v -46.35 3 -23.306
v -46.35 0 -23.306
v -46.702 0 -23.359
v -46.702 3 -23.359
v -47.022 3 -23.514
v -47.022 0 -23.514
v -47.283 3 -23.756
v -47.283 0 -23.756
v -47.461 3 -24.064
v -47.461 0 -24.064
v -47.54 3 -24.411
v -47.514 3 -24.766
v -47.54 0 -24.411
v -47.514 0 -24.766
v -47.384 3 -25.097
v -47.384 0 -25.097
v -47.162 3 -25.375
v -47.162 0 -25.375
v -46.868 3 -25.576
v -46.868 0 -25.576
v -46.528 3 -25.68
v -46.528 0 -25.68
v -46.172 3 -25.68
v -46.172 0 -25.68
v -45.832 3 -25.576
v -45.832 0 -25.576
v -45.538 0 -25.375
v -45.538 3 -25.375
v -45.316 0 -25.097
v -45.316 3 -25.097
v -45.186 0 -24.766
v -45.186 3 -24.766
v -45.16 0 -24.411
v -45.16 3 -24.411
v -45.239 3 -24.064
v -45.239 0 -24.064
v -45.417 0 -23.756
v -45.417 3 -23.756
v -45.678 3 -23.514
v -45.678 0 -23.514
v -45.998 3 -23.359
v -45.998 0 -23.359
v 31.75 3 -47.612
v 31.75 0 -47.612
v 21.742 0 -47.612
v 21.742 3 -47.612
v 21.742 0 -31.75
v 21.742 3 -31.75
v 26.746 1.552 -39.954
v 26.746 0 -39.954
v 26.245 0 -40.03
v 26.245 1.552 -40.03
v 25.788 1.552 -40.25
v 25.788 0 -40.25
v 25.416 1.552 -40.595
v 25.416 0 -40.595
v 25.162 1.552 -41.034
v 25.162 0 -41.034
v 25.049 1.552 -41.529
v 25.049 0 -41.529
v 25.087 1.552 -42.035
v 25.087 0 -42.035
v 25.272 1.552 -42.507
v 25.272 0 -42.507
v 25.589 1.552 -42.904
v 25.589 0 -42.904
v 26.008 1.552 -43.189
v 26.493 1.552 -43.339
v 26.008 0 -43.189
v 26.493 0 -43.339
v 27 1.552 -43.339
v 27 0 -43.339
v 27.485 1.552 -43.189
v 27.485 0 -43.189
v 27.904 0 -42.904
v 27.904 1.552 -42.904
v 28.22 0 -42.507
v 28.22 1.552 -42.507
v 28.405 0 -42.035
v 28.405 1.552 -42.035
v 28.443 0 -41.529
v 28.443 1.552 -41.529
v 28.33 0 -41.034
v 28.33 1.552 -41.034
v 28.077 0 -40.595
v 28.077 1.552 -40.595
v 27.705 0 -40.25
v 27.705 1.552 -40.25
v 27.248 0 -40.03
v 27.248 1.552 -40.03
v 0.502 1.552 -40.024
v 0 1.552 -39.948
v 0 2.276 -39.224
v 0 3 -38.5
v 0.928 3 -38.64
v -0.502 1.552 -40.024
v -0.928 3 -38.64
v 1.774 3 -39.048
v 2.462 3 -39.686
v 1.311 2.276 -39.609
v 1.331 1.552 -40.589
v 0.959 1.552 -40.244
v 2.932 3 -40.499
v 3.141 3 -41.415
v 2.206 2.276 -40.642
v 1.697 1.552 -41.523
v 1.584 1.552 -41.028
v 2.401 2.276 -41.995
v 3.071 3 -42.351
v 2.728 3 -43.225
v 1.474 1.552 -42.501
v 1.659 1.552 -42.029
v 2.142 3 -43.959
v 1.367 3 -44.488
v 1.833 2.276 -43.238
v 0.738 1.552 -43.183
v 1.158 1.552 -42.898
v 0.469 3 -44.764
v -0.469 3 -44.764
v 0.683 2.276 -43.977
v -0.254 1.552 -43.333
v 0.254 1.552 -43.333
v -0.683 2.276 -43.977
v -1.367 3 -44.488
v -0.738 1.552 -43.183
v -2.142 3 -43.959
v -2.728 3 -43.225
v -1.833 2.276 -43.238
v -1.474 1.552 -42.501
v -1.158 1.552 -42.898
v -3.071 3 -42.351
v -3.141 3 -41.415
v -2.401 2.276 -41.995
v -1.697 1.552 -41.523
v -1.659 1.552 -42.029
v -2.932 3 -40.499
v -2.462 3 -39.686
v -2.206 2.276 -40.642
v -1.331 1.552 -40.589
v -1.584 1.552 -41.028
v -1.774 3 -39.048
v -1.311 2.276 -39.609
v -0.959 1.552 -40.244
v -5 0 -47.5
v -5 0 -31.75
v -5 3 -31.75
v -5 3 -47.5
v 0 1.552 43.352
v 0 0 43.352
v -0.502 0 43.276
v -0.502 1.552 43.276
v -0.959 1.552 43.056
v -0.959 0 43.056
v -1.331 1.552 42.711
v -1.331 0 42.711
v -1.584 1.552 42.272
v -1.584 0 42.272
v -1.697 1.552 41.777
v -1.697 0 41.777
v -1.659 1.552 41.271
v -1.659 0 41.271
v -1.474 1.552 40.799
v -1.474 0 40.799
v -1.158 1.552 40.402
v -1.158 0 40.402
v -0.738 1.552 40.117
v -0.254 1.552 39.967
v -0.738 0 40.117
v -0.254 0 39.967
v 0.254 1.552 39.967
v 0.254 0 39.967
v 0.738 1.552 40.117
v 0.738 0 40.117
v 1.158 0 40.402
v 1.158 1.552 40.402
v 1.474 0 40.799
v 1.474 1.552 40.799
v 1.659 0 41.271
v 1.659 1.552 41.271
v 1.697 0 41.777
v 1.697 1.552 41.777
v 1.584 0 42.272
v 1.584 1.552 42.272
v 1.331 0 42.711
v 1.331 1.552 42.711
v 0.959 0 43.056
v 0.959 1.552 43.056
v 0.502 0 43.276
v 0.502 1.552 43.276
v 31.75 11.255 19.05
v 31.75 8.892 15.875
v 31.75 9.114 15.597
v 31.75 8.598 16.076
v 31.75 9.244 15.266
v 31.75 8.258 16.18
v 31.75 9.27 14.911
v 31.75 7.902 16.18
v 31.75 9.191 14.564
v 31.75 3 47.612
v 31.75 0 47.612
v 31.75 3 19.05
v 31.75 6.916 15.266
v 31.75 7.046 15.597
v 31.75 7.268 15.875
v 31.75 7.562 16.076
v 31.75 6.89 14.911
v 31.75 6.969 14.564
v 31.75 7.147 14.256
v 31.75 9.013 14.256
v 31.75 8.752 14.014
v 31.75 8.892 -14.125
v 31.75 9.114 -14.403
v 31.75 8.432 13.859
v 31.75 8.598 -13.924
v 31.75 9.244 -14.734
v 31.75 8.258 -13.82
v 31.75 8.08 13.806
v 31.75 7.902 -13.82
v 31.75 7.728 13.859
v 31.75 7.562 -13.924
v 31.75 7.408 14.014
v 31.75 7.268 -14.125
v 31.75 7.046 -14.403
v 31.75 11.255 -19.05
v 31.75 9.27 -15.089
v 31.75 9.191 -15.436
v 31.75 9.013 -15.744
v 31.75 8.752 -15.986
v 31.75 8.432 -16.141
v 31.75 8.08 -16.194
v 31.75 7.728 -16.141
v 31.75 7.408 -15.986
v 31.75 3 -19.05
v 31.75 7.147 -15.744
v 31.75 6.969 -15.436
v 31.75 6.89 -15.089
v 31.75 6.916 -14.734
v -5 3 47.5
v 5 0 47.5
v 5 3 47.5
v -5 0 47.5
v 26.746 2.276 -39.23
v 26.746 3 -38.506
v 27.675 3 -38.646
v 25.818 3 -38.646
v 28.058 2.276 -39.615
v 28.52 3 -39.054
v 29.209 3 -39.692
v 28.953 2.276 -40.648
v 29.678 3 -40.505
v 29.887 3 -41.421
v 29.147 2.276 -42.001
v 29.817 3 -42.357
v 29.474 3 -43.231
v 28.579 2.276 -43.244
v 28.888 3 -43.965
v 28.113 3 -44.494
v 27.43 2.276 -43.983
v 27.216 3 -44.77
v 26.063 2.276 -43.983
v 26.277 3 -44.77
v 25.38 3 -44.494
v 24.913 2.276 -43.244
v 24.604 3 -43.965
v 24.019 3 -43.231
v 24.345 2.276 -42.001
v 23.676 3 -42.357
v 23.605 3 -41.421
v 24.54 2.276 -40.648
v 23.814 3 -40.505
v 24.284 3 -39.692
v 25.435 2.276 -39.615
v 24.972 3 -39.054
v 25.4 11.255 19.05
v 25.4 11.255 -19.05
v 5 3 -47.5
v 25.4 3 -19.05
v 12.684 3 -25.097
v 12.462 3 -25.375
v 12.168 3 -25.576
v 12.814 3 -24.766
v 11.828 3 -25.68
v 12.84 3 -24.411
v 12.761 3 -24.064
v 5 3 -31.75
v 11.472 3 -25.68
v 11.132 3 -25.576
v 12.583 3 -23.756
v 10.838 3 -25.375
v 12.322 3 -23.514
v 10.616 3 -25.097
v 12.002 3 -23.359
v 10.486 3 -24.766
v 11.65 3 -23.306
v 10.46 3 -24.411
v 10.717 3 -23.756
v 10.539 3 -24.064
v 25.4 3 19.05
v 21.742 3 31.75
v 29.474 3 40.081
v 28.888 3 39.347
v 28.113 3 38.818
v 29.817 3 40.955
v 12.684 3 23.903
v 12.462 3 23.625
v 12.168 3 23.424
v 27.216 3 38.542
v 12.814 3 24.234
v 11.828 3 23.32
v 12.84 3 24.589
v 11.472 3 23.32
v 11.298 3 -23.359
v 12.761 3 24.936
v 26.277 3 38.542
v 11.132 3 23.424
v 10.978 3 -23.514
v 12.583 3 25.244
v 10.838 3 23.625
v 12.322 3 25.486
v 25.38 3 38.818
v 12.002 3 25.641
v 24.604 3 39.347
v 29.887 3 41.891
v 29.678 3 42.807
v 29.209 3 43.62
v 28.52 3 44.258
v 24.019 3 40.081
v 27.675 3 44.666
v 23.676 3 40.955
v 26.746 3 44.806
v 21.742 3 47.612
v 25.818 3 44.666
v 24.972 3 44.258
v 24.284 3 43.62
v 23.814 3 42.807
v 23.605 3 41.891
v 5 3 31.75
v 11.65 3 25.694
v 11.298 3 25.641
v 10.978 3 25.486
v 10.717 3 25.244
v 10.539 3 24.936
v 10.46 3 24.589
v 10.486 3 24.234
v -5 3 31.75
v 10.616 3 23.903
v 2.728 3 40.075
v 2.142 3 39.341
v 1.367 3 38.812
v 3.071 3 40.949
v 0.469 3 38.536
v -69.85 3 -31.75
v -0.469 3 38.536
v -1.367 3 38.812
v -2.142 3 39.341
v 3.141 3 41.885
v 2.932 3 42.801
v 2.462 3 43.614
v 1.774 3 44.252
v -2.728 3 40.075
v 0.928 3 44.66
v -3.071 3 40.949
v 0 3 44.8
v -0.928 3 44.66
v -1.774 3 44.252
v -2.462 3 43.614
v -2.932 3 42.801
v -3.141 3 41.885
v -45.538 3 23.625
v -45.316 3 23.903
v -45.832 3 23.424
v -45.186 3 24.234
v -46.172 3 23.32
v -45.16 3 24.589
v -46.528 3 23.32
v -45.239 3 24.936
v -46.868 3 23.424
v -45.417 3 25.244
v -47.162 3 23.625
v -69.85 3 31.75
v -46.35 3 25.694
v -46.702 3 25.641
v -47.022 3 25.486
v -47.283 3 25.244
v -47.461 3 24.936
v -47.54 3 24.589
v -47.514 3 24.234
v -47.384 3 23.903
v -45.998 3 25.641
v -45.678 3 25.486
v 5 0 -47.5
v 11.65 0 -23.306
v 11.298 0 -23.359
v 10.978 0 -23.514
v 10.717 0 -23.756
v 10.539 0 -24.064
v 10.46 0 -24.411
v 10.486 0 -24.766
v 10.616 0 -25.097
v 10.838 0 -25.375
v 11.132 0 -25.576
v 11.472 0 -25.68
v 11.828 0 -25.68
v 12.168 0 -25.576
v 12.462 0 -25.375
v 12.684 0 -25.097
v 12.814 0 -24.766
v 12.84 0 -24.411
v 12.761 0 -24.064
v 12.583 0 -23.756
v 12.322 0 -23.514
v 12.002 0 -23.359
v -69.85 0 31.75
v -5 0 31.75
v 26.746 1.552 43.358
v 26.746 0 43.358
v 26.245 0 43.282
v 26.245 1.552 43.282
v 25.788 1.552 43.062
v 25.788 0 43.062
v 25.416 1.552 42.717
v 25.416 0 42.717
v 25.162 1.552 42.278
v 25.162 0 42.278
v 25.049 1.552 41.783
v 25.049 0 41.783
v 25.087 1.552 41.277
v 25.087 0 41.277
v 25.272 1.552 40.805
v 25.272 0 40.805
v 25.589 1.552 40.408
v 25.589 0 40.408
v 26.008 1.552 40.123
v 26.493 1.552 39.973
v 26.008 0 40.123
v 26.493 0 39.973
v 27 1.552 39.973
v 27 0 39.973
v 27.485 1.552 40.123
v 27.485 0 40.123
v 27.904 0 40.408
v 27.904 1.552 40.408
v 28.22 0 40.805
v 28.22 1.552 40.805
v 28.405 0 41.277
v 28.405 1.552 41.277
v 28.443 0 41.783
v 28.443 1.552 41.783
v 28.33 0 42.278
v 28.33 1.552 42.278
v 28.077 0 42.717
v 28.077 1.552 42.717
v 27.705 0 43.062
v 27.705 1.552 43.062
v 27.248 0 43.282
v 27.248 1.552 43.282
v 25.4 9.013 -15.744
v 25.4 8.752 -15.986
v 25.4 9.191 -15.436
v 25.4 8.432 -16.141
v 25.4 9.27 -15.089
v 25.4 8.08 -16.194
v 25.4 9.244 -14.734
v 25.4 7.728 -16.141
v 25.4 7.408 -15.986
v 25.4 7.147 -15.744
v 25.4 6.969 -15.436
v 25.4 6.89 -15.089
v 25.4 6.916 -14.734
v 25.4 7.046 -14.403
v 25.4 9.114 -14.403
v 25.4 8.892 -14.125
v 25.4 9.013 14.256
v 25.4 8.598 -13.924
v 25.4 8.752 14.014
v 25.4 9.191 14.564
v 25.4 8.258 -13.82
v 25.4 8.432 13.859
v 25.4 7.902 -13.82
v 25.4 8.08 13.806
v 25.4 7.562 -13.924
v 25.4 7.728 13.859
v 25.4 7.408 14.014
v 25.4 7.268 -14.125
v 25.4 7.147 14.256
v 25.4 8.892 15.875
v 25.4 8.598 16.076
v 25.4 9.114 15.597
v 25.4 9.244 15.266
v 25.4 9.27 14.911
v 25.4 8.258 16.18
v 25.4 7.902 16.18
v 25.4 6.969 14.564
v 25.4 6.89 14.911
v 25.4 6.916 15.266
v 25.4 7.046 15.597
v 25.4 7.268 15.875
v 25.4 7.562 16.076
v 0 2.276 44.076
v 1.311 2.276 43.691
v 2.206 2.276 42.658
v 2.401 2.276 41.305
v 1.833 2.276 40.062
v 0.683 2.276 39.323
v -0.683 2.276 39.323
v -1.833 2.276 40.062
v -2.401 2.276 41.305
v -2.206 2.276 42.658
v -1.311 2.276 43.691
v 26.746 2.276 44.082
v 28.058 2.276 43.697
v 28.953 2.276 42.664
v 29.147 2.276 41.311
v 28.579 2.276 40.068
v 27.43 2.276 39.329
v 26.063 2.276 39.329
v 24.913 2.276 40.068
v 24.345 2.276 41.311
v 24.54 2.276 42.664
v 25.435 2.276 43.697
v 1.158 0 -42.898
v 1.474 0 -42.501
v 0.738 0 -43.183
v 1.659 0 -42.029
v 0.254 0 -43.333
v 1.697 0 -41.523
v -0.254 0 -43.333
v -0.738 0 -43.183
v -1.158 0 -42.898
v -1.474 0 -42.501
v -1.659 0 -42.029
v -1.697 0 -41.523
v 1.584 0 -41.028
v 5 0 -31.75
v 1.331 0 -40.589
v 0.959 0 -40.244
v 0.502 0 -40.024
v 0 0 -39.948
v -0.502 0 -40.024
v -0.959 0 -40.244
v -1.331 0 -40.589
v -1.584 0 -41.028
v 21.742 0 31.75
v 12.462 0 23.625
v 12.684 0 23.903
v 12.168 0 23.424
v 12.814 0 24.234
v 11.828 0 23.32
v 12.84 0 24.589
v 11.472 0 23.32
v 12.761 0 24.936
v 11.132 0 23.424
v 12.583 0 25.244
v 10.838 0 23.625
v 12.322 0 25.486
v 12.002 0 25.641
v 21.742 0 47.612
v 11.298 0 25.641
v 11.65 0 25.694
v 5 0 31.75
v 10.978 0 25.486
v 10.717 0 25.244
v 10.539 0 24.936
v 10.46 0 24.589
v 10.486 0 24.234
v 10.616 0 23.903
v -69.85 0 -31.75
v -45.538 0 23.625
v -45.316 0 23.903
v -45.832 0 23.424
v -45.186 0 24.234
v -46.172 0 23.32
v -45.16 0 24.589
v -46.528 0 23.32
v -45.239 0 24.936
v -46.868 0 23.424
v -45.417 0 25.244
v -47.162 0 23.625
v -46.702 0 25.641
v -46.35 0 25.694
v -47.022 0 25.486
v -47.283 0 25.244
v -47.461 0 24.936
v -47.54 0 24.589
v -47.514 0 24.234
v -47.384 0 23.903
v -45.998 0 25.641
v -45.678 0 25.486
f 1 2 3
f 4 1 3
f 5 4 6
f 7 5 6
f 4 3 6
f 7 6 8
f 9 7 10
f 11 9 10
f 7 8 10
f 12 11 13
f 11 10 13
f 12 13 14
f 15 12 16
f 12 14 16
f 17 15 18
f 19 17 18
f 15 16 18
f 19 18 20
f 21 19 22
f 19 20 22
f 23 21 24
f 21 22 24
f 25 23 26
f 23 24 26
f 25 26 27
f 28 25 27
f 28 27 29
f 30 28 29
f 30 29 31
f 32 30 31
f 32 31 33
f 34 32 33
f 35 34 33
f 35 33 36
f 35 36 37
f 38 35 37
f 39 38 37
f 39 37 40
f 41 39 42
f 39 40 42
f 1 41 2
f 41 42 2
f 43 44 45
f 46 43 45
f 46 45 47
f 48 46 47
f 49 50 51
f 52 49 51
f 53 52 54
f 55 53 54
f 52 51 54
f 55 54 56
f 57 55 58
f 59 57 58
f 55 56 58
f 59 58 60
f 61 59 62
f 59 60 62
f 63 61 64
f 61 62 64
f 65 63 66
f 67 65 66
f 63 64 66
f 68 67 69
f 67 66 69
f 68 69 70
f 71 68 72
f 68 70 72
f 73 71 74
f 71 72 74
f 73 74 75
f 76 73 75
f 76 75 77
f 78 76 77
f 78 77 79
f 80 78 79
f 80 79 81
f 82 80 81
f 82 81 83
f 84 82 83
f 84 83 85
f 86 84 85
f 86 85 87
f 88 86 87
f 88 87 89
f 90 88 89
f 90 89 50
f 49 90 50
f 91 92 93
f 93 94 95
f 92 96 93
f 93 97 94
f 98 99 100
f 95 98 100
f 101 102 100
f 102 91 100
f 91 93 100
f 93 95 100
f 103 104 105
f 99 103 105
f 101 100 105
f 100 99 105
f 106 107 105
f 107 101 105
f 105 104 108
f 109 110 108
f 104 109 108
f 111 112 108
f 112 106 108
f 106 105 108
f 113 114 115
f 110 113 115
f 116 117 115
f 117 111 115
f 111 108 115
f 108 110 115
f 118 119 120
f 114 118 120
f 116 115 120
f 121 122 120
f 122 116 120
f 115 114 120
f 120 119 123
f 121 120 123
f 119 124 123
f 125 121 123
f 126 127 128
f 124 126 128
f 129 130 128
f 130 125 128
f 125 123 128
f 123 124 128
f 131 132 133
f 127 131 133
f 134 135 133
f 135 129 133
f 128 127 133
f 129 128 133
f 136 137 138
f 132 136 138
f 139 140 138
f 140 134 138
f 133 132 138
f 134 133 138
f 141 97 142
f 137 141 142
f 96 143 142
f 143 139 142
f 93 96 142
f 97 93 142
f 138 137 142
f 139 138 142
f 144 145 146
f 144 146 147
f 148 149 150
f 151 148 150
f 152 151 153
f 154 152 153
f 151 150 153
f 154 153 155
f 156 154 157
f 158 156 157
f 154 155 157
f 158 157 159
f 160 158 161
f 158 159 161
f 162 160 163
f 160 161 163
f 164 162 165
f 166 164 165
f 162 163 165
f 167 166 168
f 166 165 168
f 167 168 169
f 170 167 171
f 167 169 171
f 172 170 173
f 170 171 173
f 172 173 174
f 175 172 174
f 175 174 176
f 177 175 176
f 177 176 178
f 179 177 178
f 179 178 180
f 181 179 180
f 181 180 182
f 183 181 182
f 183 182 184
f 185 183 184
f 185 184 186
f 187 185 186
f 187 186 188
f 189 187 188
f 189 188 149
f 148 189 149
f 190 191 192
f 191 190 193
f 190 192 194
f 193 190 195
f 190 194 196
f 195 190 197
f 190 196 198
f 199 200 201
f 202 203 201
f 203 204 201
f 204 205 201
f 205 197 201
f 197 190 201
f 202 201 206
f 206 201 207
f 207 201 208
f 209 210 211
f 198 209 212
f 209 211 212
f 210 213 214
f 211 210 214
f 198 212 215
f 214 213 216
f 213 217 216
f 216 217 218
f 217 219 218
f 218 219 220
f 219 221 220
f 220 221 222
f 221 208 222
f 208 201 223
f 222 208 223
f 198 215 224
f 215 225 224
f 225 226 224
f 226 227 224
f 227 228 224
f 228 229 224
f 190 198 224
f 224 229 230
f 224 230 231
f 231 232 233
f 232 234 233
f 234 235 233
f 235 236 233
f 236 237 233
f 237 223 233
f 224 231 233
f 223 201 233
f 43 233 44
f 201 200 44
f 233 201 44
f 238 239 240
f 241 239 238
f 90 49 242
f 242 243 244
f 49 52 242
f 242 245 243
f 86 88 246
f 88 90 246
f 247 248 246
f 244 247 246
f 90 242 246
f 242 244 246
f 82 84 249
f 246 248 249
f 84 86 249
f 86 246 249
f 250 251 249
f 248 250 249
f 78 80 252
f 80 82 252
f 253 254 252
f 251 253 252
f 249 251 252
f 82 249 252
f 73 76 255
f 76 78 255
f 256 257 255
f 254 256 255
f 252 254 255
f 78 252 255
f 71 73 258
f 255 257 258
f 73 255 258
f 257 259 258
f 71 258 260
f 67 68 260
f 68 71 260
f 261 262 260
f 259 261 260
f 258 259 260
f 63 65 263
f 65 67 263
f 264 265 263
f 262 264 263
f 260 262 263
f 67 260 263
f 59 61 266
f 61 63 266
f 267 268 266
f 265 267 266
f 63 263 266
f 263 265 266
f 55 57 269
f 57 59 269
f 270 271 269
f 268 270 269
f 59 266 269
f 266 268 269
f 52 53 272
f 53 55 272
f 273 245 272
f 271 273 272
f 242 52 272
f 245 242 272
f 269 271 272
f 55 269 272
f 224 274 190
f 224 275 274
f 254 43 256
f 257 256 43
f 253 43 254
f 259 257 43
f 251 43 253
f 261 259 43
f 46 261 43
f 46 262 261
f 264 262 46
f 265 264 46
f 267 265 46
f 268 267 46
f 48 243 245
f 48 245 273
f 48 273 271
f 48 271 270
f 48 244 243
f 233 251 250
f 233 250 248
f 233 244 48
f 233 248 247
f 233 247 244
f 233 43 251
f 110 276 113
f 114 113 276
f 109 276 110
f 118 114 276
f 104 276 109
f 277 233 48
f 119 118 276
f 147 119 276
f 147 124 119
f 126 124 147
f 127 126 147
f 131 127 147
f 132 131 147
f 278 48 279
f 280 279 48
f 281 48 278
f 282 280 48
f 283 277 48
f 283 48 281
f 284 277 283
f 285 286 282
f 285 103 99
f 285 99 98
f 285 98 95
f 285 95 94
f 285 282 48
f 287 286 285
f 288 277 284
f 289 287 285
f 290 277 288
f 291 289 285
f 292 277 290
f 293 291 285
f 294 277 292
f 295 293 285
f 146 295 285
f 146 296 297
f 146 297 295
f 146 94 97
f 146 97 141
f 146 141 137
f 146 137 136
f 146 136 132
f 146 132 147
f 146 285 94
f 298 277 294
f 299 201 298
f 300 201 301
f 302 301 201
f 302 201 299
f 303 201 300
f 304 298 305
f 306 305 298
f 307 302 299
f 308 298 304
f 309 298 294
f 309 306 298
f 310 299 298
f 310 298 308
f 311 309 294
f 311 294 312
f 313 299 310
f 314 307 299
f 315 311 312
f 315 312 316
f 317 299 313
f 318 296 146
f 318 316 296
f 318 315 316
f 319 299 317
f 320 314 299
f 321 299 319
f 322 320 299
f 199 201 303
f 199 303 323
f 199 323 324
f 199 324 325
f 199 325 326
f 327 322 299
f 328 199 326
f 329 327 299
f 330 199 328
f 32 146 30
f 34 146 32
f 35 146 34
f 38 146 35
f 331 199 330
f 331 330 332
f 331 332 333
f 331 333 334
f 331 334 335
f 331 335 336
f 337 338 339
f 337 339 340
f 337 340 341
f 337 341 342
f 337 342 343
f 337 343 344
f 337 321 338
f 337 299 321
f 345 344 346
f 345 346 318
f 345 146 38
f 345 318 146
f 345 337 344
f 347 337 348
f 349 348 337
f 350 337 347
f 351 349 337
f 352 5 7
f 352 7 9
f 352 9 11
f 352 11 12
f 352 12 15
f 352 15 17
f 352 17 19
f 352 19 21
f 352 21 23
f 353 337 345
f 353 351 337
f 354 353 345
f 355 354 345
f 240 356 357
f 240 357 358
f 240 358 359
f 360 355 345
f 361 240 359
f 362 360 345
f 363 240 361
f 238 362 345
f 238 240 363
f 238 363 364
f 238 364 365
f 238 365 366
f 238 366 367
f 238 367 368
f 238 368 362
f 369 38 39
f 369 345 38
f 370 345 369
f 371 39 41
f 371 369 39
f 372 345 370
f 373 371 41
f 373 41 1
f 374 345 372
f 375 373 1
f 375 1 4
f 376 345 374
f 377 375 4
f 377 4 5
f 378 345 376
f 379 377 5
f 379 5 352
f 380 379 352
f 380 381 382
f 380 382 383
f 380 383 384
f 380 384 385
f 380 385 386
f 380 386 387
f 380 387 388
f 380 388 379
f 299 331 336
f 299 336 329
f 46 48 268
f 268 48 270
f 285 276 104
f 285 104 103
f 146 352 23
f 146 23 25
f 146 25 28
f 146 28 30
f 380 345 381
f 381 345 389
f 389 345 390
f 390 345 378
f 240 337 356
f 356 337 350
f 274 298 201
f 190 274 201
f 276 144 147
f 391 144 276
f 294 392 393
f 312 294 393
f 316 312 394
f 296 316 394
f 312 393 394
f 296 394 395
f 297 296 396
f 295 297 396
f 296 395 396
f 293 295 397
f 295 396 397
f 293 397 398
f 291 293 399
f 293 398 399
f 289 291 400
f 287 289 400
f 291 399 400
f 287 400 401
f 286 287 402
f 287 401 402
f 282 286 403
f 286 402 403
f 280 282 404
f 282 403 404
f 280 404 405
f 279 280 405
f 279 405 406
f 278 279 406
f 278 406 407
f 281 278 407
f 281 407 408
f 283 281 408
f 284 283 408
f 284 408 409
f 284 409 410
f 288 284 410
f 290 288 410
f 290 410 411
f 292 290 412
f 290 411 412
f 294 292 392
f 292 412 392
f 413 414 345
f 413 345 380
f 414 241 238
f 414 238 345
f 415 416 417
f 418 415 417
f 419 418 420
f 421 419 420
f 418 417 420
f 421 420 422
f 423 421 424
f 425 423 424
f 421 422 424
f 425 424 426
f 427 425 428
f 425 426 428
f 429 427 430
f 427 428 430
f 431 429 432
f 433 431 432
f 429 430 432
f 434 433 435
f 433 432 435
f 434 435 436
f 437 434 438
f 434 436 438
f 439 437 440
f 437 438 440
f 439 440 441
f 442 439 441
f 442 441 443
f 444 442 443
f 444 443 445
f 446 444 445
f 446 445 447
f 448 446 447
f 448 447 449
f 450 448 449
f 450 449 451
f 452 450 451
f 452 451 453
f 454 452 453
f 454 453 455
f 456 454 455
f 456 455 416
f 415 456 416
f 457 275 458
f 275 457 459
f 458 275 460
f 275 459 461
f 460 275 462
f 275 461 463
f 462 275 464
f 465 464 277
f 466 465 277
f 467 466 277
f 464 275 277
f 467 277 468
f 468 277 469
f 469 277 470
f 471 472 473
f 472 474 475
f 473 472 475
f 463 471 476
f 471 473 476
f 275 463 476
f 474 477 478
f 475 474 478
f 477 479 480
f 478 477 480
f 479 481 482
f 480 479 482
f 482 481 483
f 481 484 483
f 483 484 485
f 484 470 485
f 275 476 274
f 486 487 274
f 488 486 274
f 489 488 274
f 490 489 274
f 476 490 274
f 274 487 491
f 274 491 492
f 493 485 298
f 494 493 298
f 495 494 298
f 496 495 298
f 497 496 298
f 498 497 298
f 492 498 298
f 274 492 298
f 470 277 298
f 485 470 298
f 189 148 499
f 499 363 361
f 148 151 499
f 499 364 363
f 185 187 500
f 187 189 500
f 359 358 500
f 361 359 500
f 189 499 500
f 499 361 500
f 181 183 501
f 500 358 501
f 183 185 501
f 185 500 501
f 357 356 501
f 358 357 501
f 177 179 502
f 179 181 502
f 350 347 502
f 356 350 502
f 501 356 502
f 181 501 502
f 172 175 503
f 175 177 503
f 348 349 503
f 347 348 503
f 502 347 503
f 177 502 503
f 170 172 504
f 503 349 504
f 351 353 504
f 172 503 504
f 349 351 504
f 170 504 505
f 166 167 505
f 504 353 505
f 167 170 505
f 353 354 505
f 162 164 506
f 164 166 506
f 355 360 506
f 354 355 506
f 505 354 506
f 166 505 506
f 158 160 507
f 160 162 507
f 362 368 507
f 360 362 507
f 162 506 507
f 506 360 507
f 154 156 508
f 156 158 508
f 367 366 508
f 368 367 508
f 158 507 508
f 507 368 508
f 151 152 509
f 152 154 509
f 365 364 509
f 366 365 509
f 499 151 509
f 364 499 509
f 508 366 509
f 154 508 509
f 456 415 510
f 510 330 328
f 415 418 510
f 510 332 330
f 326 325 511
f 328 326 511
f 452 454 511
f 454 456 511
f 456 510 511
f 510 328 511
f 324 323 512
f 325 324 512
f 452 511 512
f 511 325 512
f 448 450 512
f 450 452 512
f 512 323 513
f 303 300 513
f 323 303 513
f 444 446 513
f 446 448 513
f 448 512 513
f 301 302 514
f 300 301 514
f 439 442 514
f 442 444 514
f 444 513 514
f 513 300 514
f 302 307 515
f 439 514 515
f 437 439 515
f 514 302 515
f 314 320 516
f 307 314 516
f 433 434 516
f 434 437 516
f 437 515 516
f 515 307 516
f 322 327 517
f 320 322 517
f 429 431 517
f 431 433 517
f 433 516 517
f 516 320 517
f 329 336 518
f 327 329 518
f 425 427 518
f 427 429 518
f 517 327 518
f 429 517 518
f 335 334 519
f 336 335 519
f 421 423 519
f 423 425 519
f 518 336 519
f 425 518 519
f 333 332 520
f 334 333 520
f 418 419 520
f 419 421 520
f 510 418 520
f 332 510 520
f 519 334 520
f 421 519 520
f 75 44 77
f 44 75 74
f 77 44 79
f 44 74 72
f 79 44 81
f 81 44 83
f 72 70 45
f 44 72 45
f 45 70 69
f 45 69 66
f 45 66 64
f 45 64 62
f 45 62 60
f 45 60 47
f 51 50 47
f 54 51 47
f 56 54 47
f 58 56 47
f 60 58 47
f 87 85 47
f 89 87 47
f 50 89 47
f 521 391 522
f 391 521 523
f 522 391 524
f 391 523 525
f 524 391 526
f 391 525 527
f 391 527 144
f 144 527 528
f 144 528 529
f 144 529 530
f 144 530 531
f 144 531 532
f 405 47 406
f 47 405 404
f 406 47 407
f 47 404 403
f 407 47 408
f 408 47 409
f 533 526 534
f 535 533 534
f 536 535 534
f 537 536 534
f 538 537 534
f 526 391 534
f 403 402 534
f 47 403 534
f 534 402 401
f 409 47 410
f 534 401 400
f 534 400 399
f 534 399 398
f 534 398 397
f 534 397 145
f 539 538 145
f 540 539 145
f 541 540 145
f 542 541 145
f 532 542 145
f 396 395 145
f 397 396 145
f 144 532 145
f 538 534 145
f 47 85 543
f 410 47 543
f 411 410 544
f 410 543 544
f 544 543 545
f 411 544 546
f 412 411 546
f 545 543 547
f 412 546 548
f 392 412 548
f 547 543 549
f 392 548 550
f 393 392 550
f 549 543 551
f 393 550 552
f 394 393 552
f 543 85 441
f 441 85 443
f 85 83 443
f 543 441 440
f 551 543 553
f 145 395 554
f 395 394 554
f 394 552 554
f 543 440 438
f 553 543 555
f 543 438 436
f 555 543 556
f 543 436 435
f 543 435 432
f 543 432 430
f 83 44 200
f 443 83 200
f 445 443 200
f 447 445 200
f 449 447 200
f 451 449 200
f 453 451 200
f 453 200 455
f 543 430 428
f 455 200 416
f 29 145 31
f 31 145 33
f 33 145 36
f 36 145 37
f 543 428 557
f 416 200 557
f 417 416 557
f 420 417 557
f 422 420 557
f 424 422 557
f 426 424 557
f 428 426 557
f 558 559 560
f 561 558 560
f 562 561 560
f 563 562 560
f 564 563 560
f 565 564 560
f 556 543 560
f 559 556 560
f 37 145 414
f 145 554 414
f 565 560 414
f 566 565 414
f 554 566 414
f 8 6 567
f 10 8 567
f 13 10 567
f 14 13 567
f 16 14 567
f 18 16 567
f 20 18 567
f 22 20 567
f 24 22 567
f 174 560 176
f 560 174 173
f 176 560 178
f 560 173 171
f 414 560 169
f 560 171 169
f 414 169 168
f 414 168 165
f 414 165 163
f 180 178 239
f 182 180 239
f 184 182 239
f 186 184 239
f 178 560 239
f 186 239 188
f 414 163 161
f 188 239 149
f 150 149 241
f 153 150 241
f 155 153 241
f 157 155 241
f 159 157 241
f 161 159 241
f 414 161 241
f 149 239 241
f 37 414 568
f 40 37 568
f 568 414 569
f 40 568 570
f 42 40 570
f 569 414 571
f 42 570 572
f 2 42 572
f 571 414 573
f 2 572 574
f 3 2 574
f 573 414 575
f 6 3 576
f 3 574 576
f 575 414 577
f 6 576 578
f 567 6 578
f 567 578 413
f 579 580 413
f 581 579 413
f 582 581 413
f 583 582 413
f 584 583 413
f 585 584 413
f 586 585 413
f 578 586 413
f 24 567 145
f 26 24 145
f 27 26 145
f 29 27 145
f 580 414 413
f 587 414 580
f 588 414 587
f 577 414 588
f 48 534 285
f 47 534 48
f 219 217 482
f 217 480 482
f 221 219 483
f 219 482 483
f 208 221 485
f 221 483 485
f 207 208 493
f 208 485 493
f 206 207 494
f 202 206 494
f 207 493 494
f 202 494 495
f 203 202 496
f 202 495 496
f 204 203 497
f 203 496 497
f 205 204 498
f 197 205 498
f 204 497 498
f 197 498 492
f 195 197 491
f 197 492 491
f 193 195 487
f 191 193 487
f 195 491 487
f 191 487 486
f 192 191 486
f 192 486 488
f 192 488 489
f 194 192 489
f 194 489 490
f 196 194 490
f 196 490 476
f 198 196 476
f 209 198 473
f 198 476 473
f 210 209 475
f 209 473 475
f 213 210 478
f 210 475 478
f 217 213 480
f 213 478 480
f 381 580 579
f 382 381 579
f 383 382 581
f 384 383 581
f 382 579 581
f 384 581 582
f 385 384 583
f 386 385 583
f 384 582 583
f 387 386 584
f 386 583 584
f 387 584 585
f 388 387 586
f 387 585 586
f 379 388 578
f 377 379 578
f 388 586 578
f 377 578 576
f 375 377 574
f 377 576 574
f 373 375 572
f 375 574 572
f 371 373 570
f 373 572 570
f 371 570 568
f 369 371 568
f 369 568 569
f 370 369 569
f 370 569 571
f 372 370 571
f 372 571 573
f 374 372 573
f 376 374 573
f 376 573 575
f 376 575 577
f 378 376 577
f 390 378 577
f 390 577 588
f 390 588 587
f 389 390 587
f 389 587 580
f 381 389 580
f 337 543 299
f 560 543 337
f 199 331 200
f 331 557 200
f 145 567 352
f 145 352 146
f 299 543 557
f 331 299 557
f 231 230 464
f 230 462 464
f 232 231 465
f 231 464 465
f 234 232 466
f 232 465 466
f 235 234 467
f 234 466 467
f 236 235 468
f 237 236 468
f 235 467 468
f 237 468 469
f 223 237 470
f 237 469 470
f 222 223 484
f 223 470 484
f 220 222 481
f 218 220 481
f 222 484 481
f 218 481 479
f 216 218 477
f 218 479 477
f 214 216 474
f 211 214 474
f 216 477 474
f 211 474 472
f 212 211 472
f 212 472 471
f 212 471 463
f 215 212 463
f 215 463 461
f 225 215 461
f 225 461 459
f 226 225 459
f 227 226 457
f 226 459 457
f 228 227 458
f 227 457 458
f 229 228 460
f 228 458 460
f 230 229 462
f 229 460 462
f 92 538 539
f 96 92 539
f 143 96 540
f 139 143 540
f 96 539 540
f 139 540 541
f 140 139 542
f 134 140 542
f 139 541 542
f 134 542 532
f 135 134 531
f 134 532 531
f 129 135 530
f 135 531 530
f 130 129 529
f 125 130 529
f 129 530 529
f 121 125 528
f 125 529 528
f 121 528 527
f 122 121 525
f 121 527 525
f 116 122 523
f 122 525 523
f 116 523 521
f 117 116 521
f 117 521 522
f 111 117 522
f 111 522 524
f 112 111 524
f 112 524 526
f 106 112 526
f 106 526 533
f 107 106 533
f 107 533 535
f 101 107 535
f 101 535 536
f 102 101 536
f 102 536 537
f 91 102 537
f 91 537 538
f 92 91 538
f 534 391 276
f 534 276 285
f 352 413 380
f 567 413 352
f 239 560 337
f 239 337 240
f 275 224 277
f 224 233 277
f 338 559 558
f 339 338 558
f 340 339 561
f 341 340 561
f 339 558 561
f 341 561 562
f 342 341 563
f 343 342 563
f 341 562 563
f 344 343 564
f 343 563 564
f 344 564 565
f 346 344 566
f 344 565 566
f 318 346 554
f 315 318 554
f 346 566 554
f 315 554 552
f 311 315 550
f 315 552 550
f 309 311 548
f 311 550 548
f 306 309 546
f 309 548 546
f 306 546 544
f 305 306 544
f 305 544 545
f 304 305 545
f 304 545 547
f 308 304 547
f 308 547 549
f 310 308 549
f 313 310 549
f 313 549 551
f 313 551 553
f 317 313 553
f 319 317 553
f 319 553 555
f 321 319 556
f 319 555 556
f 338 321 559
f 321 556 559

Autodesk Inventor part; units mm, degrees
ref_plane "YZ Plane" through (0, 0, 0) normal (1, 0, 0) x (0, 1, 0)
ref_plane "XZ Plane" through (0, 0, 0) normal (0, 1, 0) x (-1, 0, 0)
ref_plane "XY Plane" through (0, 0, 0) normal (0, 0, 1) x (1, 0, 0)
sketch "Sketch1" plane through (0, 0, 0) normal (0, 1, 0) x (-1, 0, 0)
  line L0 (-5, 47.5) -> (5, 47.5)
  line L1 (5, 47.5) -> (5, -47.5)
  line L2 (5, -47.5) -> (-5, -47.5)
  line L3 (-5, -47.5) -> (-5, 47.5)
  line L4 (-5, 47.5) -> (5, -47.5) construction
  line L5 (5, 47.5) -> (-5, -47.5) construction
  line L6 (-31.75, 31.75) -> (31.75, 31.75)
  line L7 (31.75, 31.75) -> (31.75, -31.75)
  line L8 (31.75, -31.75) -> (-31.75, -31.75)
  line L9 (-31.75, -31.75) -> (-31.75, 31.75)
  line L10 (-31.75, 31.75) -> (31.75, -31.75) construction
  line L11 (31.75, 31.75) -> (-31.75, -31.75) construction
  line L12 (31.75, 31.75) -> (69.85, 31.75)
  line L13 (69.85, 31.75) -> (69.85, -31.75)
  line L14 (69.85, -31.75) -> (31.75, -31.75)
  line L15 (31.75, -31.75) -> (31.75, 31.75)
  line L16 (-31.75, 0) -> (-26.7462, 0)
  line L17 (-21.7424, 47.6123) -> (-31.75, 47.6123)
  line L18 (-31.75, 47.6123) -> (-31.75, -47.6123)
  line L19 (-31.75, -47.6123) -> (-21.7424, -47.6123)
  line L20 (-21.7424, -47.6123) -> (-21.7424, 47.6123)
  line L21 (-21.7424, 47.6123) -> (-31.75, -47.6123) construction
  line L22 (-31.75, 47.6123) -> (-21.7424, -47.6123) construction
  point P0 (0, 0)
  point P1 (-5, -31.75)
  point P2 (-5, 31.75)
  point P3 (31.75, 31.75)
  point P4 (5, 31.75)
  point P5 (5, -31.75)
  point P6 (-21.7424, -31.75)
  point P7 (-21.7424, 31.75)
  dimension "d0" = 10
  dimension "d1" = 95
  dimension "d13" = 63.5
  dimension "d14" = 63.5
  dimension "d15" = 38.1
  dimension "d47" = 5.0038
  dimension "d48" = 95.2246
extrude "Extrusion1" add sketch "Sketch1" along normal blind 3
sketch "Sketch2" plane through (0, 3, 0) normal (0, 1, 0) x (1, 0, 0)
  line L0 (0, 0) -> (0, 41.65)
  line L1 (0, 0) -> (0, -41.65)
  line L2 (21.7424, -47.6123) -> (31.75, -47.6123) projected
  line L3 (26.7462, -47.6123) -> (26.7462, 0)
  line L4 (26.7462, 0) -> (26.7462, 41.656)
  line L5 (26.7462, 0) -> (26.7462, -41.656)
  dimension "d4" = 41.65
  dimension "d5" = 41.65
  dimension "d49" = 41.656
  dimension "d50" = 41.656
hole "Hole1" at (0, 3, 41.65) at (0, 3, -41.65) at (26.7462, 3, 41.656) at (26.7462, 3, -41.656) direction (0, -1, 0) diameter 3.4036 end through all countersink diameter 6.2992 countersink angle 90 clearance for "Flat Head Machine Screw" size "M3" standard "Ansi Metric M Profile"
sketch "Sketch3" plane through (0, 3, 0) normal (0, 1, 0) x (1, 0, 0)
  line L0 (31.75, -31.75) -> (31.75, 31.75) projected
  line L1 (31.75, 0) -> (28.575, 0)
  line L2 (25.4, -19.05) -> (31.75, -19.05)
  line L3 (31.75, -19.05) -> (31.75, 19.05)
  line L4 (31.75, 19.05) -> (25.4, 19.05)
  line L5 (25.4, 19.05) -> (25.4, -19.05)
  line L6 (25.4, -19.05) -> (31.75, 19.05) construction
  line L7 (31.75, -19.05) -> (25.4, 19.05) construction
  point P0 (0, 0)
  dimension "d16" = 3.175
  dimension "d17" = 38.1
extrude "Extrusion2" add sketch "Sketch3" along normal blind 8.255
sketch "Sketch4" plane through (31.75, 0, 31.75) normal (1, 0, 0) x (0, 0, -1)
  line L0 (12.7, 11.255) -> (50.8, 11.255) projected
  line L1 (31.75, 11.255) -> (31.75, 8.08)
  line L2 (31.75, 8.08) -> (46.75, 8.08)
  line L3 (46.75, 8.08) -> (16.75, 8.08)
  point P0 (31.75, 0)
  dimension "d20" = 3.175
  dimension "d21" = 15
  dimension "d22" = 30
hole "Hole2" at (31.75, 8.08, 15) at (31.75, 8.08, -15) direction (-1, 0, 0) diameter 2.3876 end through all clearance for "Flat Head Machine Screw" size "M2" standard "Ansi Metric M Profile"
sketch "Sketch5" plane through (0, 3, 0) normal (0, 1, 0) x (1, 0, 0)
  line L0 (-69.85, 31.75) -> (-69.85, -31.75) projected
  line L1 (-69.85, 0) -> (-69.85, 24.5)
  line L2 (-69.85, 24.5) -> (-69.85, -24.5)
  line L3 (-69.85, -24.5) -> (15.15, -24.5)
  line L4 (15.15, -24.5) -> (-69.85, -24.5)
  line L5 (-69.85, -24.5) -> (-69.85, 24.5)
  line L6 (-69.85, 24.5) -> (15.15, 24.5)
  line L7 (15.15, 24.5) -> (15.15, -24.5)
  line L8 (15.15, -24.5) -> (11.65, -24.5)
  line L9 (11.65, -24.5) -> (11.65, -21)
  line L10 (11.65, -21) -> (15.15, -21)
  line L11 (15.15, -21) -> (15.15, -24.5)
  line L12 (15.15, 24.5) -> (11.65, 24.5)
  line L13 (11.65, 24.5) -> (11.65, 21)
  line L14 (11.65, 21) -> (15.15, 21)
  line L15 (15.15, 21) -> (15.15, 24.5)
  line L16 (11.65, -21) -> (-46.35, -21)
  line L17 (11.65, -21) -> (69.65, -21) construction
  line L18 (11.65, 21) -> (-46.35, 21)
  line L19 (-46.35, 21) -> (-46.35, 24.5)
  line L20 (-46.35, -21) -> (-46.35, -24.5)
  point P0 (0, 0)
  dimension "d30" = 24.5
  dimension "d31" = 49
  dimension "d32" = 85
  dimension "d33" = 3.5
  dimension "d34" = 3.5
  dimension "d35" = 3.5
  dimension "d36" = 3.5
  dimension "d37" = 58
  dimension "d38" = 180
  dimension "d39" = 58
hole "Hole3" at (11.65, 3, 24.5) at (11.65, 3, -24.5) at (-46.35, 3, -24.5) at (-46.35, 3, 24.5) direction (0, -1, 0) diameter 2.3876 end through all clearance for "Flat Head Machine Screw" size "M2" standard "Ansi Metric M Profile"
properties part number "OT2-ridingcam-r1"
